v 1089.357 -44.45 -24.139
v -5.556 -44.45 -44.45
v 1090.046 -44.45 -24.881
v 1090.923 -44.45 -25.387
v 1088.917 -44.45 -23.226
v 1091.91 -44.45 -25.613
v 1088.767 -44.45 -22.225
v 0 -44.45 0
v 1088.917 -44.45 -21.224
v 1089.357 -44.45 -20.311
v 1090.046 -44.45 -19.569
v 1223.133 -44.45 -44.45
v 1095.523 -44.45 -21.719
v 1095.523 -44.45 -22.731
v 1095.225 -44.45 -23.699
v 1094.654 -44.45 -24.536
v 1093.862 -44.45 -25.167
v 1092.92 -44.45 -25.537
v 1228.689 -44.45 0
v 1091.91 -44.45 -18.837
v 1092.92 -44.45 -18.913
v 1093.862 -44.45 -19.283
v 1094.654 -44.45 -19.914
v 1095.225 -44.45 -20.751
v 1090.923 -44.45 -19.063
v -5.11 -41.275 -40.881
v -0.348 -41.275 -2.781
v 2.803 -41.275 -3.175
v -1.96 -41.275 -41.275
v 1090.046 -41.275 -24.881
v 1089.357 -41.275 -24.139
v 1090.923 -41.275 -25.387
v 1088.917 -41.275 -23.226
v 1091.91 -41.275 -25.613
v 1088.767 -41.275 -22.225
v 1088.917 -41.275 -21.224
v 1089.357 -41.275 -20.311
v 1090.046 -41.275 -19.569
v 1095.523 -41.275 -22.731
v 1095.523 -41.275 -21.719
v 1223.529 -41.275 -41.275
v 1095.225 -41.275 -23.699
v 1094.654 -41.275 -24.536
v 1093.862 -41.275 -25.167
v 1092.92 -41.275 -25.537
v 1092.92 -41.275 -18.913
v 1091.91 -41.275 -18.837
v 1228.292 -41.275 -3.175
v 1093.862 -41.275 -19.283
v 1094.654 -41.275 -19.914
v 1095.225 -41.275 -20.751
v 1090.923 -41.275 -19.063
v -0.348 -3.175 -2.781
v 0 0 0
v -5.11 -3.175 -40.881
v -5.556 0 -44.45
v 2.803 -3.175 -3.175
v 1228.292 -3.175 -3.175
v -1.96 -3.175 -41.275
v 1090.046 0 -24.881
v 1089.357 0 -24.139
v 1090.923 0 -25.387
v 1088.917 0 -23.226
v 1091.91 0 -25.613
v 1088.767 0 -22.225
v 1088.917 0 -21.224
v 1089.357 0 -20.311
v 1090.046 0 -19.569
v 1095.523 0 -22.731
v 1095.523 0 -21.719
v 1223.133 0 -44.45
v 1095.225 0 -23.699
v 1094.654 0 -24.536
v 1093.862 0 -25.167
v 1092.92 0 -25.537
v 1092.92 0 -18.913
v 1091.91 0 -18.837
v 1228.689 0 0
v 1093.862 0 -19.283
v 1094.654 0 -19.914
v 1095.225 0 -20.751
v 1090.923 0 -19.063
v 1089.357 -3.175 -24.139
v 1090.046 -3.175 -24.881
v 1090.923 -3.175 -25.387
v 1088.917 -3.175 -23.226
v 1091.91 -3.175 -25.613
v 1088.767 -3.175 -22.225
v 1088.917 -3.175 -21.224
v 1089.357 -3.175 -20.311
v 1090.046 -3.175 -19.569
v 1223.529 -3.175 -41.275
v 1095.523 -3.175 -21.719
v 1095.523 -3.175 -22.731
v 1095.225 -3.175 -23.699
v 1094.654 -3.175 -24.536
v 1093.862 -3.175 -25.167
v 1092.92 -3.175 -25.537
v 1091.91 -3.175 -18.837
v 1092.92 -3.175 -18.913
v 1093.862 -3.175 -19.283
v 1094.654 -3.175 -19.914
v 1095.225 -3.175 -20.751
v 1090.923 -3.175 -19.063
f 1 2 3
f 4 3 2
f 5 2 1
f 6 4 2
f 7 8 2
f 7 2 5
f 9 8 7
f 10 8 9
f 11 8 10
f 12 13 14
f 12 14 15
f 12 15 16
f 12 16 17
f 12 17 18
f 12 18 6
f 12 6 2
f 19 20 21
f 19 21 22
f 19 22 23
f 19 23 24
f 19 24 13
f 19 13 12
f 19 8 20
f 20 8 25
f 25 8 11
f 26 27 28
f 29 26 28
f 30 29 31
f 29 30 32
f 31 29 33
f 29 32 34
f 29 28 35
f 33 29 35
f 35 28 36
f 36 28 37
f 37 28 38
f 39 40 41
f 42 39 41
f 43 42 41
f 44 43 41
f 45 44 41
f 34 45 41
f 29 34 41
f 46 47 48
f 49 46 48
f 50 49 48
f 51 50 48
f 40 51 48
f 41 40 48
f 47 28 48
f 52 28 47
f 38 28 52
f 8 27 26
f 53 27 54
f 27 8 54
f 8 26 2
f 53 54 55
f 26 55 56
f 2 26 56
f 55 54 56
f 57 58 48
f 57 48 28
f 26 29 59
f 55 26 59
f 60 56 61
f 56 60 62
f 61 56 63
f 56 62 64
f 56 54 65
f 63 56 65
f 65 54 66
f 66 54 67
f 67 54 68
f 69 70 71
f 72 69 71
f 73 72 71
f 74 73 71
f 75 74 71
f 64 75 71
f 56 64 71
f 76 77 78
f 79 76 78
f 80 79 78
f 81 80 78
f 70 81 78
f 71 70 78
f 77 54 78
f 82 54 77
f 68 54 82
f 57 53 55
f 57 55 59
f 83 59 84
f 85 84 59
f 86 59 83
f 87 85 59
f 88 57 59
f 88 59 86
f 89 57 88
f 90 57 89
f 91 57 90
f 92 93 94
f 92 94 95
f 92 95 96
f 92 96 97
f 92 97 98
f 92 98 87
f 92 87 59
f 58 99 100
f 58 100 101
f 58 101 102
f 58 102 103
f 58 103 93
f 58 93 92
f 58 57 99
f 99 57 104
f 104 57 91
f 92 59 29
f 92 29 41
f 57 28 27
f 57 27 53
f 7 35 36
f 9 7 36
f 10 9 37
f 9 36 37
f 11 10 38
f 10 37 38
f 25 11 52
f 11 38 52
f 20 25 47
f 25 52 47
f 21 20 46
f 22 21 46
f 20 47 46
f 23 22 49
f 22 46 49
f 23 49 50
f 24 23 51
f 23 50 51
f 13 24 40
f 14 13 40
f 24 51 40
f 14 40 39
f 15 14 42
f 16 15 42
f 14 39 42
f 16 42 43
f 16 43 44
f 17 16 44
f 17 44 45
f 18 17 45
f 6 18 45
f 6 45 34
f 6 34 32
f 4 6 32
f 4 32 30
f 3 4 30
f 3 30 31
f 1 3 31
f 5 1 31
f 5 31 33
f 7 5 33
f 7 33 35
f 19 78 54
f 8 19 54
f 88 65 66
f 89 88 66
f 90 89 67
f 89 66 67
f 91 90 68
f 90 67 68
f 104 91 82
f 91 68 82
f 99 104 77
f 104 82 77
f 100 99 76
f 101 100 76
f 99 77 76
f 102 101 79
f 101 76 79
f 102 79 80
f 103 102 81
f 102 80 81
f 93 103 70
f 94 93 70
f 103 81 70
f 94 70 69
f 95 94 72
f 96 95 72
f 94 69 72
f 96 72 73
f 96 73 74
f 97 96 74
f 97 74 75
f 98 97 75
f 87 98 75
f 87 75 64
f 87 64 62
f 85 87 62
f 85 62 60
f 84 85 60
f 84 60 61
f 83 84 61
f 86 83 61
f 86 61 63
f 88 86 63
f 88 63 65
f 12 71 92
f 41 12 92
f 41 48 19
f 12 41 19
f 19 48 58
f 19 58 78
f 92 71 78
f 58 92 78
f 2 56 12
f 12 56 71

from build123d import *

# Parameters (mm, degrees)
F1_DEPTH = 44.45
F2_T     = -3.175
F3_W     = 38.1
F3_H     = 38.3965011568
F4_DEPTH = 8.689331367
F6_D     = 6.7945


with BuildPart() as f1:
    # F0 (on Front) → F1 (new body)
    with BuildSketch(Plane.XZ):
        Polygon((-5.5562371184, -44.45), (17.9743102048, -44.45), (1223.1325170816, -44.45), (1228.6887542, 0), (0, 0), align=None)
    extrude(amount=F1_DEPTH)

    # F2
    f2_openings = [f1.faces().sort_by_distance(p)[0] for p in [
        (1225.910636, -22.225, -22.225),
    ]]
    offset(amount=F2_T, openings=f2_openings)

    # F3 (on face) → F4 (cut, through all)
    with BuildSketch(Plane(origin=(3.1504823709, 0, -0.3938093834), x_dir=(0, 1, 0), z_dir=(0.9922779121, 0, -0.1240344515))):
        with Locations((-22.225, -22.0010849282)):
            Rectangle(F3_W, F3_H)
    extrude(amount=-F4_DEPTH, mode=Mode.SUBTRACT)

    # F6 (through all)
    with Locations(Plane.XZ.offset(44.45)):
        with Locations((1092.1637542, -22.225)):
            Hole(F6_D / 2)


solid = f1.part
